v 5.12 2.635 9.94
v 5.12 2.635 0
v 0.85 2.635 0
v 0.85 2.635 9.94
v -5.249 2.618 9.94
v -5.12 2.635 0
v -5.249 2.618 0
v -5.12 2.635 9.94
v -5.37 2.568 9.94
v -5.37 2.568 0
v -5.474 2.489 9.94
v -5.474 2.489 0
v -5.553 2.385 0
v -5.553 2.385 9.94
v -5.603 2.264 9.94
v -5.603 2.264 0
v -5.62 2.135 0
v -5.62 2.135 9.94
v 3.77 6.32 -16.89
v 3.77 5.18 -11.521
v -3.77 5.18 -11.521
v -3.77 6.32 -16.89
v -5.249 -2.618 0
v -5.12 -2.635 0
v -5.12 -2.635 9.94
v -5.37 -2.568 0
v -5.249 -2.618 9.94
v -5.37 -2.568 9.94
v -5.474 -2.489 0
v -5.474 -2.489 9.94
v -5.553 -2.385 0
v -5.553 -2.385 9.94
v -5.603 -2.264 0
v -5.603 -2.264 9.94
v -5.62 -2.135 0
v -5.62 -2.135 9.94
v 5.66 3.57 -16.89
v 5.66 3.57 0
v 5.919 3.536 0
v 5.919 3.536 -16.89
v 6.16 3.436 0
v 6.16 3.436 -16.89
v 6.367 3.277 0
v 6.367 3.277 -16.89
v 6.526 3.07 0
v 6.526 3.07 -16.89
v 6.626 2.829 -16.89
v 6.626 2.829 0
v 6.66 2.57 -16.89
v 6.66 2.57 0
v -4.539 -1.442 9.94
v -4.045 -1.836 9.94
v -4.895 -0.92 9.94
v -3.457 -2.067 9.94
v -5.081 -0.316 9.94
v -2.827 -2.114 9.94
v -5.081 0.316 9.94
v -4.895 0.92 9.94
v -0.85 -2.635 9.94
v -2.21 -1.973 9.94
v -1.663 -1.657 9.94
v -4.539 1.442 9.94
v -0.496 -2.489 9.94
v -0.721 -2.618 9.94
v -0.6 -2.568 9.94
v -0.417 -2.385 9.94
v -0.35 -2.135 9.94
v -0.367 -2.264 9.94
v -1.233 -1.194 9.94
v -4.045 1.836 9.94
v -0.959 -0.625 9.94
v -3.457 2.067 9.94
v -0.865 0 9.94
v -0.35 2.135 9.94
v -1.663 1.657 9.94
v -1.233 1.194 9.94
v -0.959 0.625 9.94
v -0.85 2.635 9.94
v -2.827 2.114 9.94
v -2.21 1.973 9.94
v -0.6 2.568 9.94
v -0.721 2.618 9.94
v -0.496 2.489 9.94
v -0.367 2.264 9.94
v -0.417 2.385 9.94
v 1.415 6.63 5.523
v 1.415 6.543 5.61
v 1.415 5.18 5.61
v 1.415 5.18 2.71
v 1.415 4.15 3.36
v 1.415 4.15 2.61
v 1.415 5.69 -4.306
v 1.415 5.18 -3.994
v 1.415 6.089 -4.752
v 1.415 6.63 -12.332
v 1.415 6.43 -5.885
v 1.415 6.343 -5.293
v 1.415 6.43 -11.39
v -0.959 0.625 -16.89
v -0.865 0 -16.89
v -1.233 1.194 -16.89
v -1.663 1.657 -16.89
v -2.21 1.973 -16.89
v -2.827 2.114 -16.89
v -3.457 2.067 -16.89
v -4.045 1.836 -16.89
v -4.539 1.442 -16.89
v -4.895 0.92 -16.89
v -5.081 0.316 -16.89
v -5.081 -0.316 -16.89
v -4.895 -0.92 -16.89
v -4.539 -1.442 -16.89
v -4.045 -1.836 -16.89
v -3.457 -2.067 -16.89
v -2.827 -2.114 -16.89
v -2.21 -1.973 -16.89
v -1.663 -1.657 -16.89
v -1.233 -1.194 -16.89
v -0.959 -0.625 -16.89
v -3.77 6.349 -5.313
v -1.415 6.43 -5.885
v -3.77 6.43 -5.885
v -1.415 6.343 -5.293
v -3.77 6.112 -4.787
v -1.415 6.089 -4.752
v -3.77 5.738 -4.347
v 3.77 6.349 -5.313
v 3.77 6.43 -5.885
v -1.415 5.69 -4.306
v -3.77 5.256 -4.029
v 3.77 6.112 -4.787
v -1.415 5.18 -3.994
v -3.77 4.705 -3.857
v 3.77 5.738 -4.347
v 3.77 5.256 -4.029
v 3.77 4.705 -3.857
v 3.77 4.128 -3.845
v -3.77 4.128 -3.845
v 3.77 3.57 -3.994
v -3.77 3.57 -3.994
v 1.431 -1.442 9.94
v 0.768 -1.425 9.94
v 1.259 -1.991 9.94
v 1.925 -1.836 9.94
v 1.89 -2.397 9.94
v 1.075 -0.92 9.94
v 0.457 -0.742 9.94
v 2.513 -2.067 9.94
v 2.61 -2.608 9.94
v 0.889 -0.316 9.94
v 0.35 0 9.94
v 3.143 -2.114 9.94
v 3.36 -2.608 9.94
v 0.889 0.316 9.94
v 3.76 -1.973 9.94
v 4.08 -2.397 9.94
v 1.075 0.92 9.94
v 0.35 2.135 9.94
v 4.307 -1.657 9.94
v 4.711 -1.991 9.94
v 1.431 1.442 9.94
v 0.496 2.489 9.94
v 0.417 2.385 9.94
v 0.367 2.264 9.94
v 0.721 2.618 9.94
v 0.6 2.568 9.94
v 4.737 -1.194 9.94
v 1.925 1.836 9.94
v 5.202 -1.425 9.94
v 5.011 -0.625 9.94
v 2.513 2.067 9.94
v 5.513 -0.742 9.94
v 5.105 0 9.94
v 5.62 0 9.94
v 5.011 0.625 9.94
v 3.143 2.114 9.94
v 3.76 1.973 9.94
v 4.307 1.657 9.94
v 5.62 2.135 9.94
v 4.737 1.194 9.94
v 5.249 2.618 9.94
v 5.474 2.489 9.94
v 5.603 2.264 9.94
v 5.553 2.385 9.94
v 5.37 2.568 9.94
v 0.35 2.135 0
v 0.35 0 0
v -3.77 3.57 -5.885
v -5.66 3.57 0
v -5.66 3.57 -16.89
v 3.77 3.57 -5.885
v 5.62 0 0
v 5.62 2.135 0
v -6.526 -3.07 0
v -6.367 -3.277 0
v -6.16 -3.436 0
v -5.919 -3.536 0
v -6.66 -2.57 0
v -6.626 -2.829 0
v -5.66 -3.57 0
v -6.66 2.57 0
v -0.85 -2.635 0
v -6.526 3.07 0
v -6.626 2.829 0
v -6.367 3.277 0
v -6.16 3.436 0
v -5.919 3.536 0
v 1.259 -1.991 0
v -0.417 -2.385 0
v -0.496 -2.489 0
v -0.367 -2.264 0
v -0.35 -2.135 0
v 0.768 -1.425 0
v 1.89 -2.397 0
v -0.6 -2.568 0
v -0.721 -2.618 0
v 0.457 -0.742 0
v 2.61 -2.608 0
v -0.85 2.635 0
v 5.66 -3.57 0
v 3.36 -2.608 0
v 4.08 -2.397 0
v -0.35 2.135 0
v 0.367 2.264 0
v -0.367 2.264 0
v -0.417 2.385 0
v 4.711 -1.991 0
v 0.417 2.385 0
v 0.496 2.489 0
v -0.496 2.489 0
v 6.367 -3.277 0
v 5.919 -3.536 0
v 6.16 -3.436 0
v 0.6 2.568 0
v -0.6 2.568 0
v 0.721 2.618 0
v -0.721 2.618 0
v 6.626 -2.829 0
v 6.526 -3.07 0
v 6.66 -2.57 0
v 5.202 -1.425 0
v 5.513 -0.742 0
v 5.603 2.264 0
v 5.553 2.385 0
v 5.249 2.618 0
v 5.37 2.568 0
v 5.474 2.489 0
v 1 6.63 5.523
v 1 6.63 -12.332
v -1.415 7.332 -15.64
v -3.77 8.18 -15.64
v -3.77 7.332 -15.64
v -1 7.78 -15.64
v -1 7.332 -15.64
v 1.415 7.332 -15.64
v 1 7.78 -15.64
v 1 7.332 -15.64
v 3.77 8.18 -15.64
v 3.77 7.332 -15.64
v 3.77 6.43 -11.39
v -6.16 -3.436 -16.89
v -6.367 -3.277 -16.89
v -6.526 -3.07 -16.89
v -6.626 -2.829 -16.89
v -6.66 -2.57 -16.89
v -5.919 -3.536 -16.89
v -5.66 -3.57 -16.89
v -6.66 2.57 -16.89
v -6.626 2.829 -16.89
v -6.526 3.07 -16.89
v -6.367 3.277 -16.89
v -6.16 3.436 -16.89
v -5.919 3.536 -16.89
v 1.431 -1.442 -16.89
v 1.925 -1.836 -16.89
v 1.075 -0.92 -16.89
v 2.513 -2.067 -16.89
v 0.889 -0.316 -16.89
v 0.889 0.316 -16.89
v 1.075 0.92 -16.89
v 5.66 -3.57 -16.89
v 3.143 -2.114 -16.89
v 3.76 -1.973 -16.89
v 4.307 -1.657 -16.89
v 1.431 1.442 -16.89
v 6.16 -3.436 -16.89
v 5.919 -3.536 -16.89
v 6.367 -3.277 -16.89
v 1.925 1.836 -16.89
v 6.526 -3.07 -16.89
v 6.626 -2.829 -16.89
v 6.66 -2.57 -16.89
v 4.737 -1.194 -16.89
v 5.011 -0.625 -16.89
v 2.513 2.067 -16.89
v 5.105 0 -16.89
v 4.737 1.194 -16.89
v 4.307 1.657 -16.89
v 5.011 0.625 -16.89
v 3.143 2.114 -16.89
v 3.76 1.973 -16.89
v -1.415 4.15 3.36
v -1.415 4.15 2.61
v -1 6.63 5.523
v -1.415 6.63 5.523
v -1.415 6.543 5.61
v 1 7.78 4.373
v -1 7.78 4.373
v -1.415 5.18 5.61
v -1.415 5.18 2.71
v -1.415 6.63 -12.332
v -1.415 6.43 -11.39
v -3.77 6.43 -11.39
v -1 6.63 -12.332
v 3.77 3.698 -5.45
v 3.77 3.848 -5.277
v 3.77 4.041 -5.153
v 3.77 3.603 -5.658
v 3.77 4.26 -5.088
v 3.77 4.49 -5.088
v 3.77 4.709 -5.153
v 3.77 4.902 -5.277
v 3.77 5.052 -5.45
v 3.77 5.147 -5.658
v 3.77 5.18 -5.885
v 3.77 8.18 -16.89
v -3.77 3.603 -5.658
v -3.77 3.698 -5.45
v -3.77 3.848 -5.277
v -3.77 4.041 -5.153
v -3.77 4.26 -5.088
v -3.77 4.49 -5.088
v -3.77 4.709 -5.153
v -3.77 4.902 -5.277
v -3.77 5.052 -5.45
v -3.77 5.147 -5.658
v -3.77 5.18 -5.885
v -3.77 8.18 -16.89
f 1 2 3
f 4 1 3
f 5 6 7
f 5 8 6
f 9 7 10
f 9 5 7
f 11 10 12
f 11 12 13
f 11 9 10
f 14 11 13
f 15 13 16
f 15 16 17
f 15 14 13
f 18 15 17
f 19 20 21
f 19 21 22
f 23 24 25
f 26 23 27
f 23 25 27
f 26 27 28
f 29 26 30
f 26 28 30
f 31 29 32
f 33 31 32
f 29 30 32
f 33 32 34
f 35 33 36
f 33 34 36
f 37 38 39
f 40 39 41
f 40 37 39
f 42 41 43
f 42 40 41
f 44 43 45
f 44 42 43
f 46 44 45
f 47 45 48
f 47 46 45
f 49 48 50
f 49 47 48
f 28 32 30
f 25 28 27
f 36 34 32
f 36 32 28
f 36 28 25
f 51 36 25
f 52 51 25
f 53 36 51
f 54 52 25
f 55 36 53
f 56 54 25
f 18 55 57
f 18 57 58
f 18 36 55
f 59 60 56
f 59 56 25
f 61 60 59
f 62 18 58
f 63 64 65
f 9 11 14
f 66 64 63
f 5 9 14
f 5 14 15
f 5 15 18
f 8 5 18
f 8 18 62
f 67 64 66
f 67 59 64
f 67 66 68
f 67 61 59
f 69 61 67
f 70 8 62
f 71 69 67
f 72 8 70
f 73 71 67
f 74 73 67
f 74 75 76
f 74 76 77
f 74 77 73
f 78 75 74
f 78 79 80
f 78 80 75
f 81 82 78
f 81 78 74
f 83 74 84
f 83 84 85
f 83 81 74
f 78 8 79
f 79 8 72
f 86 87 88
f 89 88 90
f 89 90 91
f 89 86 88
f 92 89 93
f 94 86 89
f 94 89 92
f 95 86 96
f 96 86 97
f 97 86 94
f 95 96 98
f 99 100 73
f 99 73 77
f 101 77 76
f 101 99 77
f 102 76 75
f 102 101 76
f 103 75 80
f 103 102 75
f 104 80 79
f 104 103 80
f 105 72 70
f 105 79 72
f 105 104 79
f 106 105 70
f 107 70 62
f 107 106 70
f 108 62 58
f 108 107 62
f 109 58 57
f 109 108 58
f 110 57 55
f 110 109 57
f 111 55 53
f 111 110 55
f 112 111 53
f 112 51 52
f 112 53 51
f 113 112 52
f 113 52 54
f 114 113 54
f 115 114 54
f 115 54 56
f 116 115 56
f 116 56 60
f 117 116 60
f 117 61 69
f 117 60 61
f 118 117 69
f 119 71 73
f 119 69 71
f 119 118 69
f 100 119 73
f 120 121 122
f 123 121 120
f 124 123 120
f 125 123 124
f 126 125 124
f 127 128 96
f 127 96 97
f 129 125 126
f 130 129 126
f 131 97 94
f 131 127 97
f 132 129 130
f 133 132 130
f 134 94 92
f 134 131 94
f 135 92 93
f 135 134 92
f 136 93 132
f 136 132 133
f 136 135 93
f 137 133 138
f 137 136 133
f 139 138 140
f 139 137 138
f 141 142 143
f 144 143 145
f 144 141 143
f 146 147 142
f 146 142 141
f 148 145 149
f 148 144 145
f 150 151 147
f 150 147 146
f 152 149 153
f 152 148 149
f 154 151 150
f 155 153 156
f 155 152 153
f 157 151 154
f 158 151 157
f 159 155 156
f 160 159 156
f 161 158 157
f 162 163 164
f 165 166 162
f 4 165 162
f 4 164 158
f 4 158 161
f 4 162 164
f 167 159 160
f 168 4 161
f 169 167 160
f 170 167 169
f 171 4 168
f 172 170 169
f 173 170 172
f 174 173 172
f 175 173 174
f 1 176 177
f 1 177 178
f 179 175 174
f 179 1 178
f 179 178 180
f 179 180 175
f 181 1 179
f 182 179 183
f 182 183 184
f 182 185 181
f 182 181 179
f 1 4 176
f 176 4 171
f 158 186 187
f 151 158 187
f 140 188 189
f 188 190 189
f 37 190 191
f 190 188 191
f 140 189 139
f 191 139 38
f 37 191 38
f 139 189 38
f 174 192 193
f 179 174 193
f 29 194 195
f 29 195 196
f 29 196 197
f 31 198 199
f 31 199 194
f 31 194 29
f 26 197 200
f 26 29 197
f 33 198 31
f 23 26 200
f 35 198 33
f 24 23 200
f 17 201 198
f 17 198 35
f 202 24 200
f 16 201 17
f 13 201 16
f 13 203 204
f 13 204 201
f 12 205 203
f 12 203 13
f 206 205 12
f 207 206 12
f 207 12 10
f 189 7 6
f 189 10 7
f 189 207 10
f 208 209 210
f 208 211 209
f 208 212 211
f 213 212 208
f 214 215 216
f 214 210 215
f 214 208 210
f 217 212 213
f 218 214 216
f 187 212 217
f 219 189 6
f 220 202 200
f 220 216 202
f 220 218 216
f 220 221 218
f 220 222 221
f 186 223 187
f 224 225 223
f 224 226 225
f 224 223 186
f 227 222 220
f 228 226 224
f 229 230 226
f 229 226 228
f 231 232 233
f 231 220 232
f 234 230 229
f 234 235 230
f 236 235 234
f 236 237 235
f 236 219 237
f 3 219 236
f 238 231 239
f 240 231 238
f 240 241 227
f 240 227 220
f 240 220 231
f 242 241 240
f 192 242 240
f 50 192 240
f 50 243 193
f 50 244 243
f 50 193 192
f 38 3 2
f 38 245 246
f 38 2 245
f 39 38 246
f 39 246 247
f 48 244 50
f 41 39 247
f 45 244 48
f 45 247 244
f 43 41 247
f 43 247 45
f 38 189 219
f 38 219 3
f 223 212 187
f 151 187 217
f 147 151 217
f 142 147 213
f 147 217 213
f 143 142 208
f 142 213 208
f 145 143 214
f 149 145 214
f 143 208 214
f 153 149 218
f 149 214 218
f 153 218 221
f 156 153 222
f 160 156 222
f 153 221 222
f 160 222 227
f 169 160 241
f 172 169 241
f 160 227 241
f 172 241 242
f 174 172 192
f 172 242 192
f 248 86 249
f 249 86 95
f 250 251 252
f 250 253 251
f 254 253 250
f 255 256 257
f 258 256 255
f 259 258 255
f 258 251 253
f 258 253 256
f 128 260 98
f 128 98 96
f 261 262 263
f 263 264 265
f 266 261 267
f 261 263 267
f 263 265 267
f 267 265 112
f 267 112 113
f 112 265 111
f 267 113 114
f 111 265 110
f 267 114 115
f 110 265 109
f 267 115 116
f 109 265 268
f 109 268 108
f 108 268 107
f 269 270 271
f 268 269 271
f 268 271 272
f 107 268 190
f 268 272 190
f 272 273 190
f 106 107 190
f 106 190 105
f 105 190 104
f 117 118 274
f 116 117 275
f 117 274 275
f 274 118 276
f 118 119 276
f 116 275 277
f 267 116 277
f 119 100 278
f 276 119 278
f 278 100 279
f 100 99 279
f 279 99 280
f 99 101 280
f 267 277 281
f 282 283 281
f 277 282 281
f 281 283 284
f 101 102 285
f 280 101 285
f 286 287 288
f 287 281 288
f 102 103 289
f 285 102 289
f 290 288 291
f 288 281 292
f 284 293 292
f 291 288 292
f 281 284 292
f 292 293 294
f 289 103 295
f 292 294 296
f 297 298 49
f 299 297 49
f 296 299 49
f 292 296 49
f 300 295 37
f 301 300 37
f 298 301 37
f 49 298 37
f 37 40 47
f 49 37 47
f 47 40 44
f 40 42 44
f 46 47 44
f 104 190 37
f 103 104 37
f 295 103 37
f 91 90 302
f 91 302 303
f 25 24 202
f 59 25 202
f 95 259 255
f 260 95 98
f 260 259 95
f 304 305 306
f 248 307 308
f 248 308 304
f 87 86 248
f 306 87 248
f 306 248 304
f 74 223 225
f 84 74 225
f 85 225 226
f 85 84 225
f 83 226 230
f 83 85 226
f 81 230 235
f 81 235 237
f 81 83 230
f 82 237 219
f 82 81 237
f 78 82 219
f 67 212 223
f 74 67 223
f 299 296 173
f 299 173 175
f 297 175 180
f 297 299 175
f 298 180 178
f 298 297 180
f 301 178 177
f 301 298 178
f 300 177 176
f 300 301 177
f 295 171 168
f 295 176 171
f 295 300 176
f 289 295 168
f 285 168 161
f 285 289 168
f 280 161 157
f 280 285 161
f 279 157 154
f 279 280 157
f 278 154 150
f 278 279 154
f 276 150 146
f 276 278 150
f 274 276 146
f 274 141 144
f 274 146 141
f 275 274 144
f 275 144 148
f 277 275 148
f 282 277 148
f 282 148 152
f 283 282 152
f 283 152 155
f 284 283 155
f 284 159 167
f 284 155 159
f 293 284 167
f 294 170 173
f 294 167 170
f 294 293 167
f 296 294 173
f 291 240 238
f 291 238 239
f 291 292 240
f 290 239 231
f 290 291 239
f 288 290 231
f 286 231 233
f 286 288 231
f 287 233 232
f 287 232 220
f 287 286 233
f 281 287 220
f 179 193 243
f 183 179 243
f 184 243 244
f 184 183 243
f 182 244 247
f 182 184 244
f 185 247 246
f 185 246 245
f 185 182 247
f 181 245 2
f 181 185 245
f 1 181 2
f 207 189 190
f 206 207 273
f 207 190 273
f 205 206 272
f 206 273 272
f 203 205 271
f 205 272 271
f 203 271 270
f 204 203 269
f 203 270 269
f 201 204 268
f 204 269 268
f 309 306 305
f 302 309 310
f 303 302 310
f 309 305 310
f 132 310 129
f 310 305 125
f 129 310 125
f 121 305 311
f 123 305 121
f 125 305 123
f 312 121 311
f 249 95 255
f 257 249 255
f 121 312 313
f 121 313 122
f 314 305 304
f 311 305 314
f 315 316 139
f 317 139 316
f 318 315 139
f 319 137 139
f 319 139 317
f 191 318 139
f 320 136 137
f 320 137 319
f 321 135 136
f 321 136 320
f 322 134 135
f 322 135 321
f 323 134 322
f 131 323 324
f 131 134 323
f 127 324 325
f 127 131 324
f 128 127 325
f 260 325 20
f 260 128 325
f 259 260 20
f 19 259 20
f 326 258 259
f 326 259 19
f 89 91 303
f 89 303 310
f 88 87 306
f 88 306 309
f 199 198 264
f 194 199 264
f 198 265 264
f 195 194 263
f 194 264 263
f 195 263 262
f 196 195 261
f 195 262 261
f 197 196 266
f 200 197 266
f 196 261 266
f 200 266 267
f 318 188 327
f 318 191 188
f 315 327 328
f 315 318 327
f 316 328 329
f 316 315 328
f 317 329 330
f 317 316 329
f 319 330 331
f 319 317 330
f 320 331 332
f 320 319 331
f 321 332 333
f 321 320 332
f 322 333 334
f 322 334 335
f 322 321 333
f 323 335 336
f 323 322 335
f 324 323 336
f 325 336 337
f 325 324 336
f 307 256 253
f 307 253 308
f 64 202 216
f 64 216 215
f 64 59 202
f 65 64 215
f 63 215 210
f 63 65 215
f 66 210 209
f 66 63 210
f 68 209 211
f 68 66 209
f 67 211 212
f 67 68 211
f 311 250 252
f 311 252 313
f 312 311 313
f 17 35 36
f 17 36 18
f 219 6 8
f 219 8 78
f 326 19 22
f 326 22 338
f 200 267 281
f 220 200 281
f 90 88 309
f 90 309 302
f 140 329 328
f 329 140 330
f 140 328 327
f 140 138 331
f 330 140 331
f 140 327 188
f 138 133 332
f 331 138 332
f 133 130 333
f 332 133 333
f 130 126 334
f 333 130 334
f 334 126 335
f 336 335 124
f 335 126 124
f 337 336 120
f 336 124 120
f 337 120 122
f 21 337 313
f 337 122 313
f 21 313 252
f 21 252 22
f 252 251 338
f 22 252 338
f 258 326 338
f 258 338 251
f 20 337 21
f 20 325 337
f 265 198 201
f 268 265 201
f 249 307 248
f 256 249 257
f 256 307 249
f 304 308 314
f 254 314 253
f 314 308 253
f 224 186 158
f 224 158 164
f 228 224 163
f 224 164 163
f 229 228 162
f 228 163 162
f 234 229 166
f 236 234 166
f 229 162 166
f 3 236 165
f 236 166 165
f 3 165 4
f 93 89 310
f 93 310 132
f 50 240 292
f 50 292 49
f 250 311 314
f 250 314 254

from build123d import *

# Parameters (mm, degrees)
SKETCH1_W               = 13.32
SKETCH1_H               = 7.14
BOSS_EXTRUDE1_DEPTH     = 16.89
SKETCH2_W               = 5.27
SKETCH2_H               = 5.27
BOSS_EXTRUDE2_DEPTH     = 9.94
CUT_EXTRUDE1_DEPTH      = 19.503313217
CUT_EXTRUDE1_DEPTH_BACK = 19.503313217
SKETCH3_R               = 2.12
BOSS_EXTRUDE3_DEPTH     = 3.77
BOSS_EXTRUDE4_DEPTH     = 1.415
CUT_EXTRUDE3_DEPTH      = 0.415
CUT_EXTRUDE4_DEPTH      = 0.415
FILLET1_R               = 1
FILLET2_R               = 0.5


with BuildPart() as part:
    # Sketch1 → Boss-Extrude1 (new body)
    with BuildSketch(Plane.XY):
        Rectangle(SKETCH1_W, SKETCH1_H)
    extrude(amount=-BOSS_EXTRUDE1_DEPTH)

    # Sketch2 → Boss-Extrude2 (add)
    with BuildSketch(Plane.XY):
        with BuildLine():
            Line((0.35, 2.635), (0.35, 0))
            ThreePointArc((0.35, 0), (2.985, -2.635), (5.62, 0))
            Line((5.62, 0), (5.62, 2.635))
            Line((5.62, 2.635), (0.35, 2.635))
        make_face()
        with Locations((-2.985, 0)):
            Rectangle(SKETCH2_W, SKETCH2_H)
    extrude(amount=BOSS_EXTRUDE2_DEPTH)

    # Sketch3 → Cut-Extrude1 (cut, two sides: drawn at the far end of the back side and taken through both)
    with BuildSketch(Plane.XY.offset(-CUT_EXTRUDE1_DEPTH_BACK)):
        with Locations((2.985, 0)):
            Circle(SKETCH3_R)
        with Locations((-2.985, 0)):
            Circle(SKETCH3_R)
    extrude(amount=CUT_EXTRUDE1_DEPTH + CUT_EXTRUDE1_DEPTH_BACK, mode=Mode.SUBTRACT)

    # Sketch4 → Boss-Extrude3 (add, symmetric)
    with BuildSketch(Plane(origin=(0, 0, 0), x_dir=(0, 0, -1), z_dir=(1, 0, 0))):
        with BuildLine():
            Line((5.885, 5.18), (11.5212493, 5.18))
            Line((11.5212493, 5.18), (16.89, 6.32))
            Line((16.89, 6.32), (16.89, 8.18))
            Line((16.89, 8.18), (15.64, 8.18))
            Line((15.64, 8.18), (15.64, 7.332444585))
            Line((15.64, 7.332444585), (11.39, 6.43))
            Line((11.39, 6.43), (5.885, 6.43))
            ThreePointArc((5.885, 6.43), (4.170750893, 5.508302696), (3.99423296, 3.57))
            Line((3.99423296, 3.57), (5.885, 3.57))
            ThreePointArc((5.885, 3.57), (5.08, 4.375), (5.885, 5.18))
        make_face()
    extrude(amount=BOSS_EXTRUDE3_DEPTH, both=True)

    # Sketch5 → Boss-Extrude4 (add, symmetric)
    with BuildSketch(Plane(origin=(0, 0, 0), x_dir=(0, 0, -1), z_dir=(1, 0, 0))):
        Polygon((15.64, 7.78), (-4.372563133, 7.78), (-5.61, 6.542563133), (-5.61, 5.18), (-3.36, 4.15), (-2.61, 4.15), (-2.71, 5.18), (5.503211952, 5.18), (15.64, 7.332444585), align=None)
    extrude(amount=BOSS_EXTRUDE4_DEPTH, both=True)

    # Sketch7 → Cut-Extrude3 (cut)
    with BuildSketch(Plane.ZY.offset(1.415)):
        Polygon((4.372563133, 7.78), (5.522563133, 6.63), (-12.331886088, 6.63), (-15.64, 7.332444585), (-15.64, 7.78), align=None)
    extrude(amount=-CUT_EXTRUDE3_DEPTH, mode=Mode.SUBTRACT)

    # Sketch8 → Cut-Extrude4 (cut)
    with BuildSketch(Plane(origin=(1.415, 0, 0), x_dir=(0, 0, -1), z_dir=(1, 0, 0))):
        Polygon((-4.372563133, 7.78), (-5.522563133, 6.63), (12.331886088, 6.63), (15.64, 7.332444585), (15.64, 7.78), align=None)
    extrude(amount=-CUT_EXTRUDE4_DEPTH, mode=Mode.SUBTRACT)

    # Fillet1
    fillet1_edges = [part.edges().sort_by_distance(p)[0] for p in [
        (-6.66, -3.57, -8.445),
        (6.66, -3.57, -8.445),
        (6.66, 3.57, -8.445),
        (-6.66, 3.57, -8.445),
    ]]
    fillet(fillet1_edges, radius=FILLET1_R)

    # Fillet2
    fillet2_edges = [part.edges().sort_by_distance(p)[0] for p in [
        (-5.62, -2.635, 4.97),
        (-0.35, -2.635, 4.97),
        (-0.35, 2.635, 4.97),
        (-5.62, 2.635, 4.97),
        (5.62, 2.635, 4.97),
        (0.35, 2.635, 4.97),
    ]]
    fillet(fillet2_edges, radius=FILLET2_R)


solid = part.part
